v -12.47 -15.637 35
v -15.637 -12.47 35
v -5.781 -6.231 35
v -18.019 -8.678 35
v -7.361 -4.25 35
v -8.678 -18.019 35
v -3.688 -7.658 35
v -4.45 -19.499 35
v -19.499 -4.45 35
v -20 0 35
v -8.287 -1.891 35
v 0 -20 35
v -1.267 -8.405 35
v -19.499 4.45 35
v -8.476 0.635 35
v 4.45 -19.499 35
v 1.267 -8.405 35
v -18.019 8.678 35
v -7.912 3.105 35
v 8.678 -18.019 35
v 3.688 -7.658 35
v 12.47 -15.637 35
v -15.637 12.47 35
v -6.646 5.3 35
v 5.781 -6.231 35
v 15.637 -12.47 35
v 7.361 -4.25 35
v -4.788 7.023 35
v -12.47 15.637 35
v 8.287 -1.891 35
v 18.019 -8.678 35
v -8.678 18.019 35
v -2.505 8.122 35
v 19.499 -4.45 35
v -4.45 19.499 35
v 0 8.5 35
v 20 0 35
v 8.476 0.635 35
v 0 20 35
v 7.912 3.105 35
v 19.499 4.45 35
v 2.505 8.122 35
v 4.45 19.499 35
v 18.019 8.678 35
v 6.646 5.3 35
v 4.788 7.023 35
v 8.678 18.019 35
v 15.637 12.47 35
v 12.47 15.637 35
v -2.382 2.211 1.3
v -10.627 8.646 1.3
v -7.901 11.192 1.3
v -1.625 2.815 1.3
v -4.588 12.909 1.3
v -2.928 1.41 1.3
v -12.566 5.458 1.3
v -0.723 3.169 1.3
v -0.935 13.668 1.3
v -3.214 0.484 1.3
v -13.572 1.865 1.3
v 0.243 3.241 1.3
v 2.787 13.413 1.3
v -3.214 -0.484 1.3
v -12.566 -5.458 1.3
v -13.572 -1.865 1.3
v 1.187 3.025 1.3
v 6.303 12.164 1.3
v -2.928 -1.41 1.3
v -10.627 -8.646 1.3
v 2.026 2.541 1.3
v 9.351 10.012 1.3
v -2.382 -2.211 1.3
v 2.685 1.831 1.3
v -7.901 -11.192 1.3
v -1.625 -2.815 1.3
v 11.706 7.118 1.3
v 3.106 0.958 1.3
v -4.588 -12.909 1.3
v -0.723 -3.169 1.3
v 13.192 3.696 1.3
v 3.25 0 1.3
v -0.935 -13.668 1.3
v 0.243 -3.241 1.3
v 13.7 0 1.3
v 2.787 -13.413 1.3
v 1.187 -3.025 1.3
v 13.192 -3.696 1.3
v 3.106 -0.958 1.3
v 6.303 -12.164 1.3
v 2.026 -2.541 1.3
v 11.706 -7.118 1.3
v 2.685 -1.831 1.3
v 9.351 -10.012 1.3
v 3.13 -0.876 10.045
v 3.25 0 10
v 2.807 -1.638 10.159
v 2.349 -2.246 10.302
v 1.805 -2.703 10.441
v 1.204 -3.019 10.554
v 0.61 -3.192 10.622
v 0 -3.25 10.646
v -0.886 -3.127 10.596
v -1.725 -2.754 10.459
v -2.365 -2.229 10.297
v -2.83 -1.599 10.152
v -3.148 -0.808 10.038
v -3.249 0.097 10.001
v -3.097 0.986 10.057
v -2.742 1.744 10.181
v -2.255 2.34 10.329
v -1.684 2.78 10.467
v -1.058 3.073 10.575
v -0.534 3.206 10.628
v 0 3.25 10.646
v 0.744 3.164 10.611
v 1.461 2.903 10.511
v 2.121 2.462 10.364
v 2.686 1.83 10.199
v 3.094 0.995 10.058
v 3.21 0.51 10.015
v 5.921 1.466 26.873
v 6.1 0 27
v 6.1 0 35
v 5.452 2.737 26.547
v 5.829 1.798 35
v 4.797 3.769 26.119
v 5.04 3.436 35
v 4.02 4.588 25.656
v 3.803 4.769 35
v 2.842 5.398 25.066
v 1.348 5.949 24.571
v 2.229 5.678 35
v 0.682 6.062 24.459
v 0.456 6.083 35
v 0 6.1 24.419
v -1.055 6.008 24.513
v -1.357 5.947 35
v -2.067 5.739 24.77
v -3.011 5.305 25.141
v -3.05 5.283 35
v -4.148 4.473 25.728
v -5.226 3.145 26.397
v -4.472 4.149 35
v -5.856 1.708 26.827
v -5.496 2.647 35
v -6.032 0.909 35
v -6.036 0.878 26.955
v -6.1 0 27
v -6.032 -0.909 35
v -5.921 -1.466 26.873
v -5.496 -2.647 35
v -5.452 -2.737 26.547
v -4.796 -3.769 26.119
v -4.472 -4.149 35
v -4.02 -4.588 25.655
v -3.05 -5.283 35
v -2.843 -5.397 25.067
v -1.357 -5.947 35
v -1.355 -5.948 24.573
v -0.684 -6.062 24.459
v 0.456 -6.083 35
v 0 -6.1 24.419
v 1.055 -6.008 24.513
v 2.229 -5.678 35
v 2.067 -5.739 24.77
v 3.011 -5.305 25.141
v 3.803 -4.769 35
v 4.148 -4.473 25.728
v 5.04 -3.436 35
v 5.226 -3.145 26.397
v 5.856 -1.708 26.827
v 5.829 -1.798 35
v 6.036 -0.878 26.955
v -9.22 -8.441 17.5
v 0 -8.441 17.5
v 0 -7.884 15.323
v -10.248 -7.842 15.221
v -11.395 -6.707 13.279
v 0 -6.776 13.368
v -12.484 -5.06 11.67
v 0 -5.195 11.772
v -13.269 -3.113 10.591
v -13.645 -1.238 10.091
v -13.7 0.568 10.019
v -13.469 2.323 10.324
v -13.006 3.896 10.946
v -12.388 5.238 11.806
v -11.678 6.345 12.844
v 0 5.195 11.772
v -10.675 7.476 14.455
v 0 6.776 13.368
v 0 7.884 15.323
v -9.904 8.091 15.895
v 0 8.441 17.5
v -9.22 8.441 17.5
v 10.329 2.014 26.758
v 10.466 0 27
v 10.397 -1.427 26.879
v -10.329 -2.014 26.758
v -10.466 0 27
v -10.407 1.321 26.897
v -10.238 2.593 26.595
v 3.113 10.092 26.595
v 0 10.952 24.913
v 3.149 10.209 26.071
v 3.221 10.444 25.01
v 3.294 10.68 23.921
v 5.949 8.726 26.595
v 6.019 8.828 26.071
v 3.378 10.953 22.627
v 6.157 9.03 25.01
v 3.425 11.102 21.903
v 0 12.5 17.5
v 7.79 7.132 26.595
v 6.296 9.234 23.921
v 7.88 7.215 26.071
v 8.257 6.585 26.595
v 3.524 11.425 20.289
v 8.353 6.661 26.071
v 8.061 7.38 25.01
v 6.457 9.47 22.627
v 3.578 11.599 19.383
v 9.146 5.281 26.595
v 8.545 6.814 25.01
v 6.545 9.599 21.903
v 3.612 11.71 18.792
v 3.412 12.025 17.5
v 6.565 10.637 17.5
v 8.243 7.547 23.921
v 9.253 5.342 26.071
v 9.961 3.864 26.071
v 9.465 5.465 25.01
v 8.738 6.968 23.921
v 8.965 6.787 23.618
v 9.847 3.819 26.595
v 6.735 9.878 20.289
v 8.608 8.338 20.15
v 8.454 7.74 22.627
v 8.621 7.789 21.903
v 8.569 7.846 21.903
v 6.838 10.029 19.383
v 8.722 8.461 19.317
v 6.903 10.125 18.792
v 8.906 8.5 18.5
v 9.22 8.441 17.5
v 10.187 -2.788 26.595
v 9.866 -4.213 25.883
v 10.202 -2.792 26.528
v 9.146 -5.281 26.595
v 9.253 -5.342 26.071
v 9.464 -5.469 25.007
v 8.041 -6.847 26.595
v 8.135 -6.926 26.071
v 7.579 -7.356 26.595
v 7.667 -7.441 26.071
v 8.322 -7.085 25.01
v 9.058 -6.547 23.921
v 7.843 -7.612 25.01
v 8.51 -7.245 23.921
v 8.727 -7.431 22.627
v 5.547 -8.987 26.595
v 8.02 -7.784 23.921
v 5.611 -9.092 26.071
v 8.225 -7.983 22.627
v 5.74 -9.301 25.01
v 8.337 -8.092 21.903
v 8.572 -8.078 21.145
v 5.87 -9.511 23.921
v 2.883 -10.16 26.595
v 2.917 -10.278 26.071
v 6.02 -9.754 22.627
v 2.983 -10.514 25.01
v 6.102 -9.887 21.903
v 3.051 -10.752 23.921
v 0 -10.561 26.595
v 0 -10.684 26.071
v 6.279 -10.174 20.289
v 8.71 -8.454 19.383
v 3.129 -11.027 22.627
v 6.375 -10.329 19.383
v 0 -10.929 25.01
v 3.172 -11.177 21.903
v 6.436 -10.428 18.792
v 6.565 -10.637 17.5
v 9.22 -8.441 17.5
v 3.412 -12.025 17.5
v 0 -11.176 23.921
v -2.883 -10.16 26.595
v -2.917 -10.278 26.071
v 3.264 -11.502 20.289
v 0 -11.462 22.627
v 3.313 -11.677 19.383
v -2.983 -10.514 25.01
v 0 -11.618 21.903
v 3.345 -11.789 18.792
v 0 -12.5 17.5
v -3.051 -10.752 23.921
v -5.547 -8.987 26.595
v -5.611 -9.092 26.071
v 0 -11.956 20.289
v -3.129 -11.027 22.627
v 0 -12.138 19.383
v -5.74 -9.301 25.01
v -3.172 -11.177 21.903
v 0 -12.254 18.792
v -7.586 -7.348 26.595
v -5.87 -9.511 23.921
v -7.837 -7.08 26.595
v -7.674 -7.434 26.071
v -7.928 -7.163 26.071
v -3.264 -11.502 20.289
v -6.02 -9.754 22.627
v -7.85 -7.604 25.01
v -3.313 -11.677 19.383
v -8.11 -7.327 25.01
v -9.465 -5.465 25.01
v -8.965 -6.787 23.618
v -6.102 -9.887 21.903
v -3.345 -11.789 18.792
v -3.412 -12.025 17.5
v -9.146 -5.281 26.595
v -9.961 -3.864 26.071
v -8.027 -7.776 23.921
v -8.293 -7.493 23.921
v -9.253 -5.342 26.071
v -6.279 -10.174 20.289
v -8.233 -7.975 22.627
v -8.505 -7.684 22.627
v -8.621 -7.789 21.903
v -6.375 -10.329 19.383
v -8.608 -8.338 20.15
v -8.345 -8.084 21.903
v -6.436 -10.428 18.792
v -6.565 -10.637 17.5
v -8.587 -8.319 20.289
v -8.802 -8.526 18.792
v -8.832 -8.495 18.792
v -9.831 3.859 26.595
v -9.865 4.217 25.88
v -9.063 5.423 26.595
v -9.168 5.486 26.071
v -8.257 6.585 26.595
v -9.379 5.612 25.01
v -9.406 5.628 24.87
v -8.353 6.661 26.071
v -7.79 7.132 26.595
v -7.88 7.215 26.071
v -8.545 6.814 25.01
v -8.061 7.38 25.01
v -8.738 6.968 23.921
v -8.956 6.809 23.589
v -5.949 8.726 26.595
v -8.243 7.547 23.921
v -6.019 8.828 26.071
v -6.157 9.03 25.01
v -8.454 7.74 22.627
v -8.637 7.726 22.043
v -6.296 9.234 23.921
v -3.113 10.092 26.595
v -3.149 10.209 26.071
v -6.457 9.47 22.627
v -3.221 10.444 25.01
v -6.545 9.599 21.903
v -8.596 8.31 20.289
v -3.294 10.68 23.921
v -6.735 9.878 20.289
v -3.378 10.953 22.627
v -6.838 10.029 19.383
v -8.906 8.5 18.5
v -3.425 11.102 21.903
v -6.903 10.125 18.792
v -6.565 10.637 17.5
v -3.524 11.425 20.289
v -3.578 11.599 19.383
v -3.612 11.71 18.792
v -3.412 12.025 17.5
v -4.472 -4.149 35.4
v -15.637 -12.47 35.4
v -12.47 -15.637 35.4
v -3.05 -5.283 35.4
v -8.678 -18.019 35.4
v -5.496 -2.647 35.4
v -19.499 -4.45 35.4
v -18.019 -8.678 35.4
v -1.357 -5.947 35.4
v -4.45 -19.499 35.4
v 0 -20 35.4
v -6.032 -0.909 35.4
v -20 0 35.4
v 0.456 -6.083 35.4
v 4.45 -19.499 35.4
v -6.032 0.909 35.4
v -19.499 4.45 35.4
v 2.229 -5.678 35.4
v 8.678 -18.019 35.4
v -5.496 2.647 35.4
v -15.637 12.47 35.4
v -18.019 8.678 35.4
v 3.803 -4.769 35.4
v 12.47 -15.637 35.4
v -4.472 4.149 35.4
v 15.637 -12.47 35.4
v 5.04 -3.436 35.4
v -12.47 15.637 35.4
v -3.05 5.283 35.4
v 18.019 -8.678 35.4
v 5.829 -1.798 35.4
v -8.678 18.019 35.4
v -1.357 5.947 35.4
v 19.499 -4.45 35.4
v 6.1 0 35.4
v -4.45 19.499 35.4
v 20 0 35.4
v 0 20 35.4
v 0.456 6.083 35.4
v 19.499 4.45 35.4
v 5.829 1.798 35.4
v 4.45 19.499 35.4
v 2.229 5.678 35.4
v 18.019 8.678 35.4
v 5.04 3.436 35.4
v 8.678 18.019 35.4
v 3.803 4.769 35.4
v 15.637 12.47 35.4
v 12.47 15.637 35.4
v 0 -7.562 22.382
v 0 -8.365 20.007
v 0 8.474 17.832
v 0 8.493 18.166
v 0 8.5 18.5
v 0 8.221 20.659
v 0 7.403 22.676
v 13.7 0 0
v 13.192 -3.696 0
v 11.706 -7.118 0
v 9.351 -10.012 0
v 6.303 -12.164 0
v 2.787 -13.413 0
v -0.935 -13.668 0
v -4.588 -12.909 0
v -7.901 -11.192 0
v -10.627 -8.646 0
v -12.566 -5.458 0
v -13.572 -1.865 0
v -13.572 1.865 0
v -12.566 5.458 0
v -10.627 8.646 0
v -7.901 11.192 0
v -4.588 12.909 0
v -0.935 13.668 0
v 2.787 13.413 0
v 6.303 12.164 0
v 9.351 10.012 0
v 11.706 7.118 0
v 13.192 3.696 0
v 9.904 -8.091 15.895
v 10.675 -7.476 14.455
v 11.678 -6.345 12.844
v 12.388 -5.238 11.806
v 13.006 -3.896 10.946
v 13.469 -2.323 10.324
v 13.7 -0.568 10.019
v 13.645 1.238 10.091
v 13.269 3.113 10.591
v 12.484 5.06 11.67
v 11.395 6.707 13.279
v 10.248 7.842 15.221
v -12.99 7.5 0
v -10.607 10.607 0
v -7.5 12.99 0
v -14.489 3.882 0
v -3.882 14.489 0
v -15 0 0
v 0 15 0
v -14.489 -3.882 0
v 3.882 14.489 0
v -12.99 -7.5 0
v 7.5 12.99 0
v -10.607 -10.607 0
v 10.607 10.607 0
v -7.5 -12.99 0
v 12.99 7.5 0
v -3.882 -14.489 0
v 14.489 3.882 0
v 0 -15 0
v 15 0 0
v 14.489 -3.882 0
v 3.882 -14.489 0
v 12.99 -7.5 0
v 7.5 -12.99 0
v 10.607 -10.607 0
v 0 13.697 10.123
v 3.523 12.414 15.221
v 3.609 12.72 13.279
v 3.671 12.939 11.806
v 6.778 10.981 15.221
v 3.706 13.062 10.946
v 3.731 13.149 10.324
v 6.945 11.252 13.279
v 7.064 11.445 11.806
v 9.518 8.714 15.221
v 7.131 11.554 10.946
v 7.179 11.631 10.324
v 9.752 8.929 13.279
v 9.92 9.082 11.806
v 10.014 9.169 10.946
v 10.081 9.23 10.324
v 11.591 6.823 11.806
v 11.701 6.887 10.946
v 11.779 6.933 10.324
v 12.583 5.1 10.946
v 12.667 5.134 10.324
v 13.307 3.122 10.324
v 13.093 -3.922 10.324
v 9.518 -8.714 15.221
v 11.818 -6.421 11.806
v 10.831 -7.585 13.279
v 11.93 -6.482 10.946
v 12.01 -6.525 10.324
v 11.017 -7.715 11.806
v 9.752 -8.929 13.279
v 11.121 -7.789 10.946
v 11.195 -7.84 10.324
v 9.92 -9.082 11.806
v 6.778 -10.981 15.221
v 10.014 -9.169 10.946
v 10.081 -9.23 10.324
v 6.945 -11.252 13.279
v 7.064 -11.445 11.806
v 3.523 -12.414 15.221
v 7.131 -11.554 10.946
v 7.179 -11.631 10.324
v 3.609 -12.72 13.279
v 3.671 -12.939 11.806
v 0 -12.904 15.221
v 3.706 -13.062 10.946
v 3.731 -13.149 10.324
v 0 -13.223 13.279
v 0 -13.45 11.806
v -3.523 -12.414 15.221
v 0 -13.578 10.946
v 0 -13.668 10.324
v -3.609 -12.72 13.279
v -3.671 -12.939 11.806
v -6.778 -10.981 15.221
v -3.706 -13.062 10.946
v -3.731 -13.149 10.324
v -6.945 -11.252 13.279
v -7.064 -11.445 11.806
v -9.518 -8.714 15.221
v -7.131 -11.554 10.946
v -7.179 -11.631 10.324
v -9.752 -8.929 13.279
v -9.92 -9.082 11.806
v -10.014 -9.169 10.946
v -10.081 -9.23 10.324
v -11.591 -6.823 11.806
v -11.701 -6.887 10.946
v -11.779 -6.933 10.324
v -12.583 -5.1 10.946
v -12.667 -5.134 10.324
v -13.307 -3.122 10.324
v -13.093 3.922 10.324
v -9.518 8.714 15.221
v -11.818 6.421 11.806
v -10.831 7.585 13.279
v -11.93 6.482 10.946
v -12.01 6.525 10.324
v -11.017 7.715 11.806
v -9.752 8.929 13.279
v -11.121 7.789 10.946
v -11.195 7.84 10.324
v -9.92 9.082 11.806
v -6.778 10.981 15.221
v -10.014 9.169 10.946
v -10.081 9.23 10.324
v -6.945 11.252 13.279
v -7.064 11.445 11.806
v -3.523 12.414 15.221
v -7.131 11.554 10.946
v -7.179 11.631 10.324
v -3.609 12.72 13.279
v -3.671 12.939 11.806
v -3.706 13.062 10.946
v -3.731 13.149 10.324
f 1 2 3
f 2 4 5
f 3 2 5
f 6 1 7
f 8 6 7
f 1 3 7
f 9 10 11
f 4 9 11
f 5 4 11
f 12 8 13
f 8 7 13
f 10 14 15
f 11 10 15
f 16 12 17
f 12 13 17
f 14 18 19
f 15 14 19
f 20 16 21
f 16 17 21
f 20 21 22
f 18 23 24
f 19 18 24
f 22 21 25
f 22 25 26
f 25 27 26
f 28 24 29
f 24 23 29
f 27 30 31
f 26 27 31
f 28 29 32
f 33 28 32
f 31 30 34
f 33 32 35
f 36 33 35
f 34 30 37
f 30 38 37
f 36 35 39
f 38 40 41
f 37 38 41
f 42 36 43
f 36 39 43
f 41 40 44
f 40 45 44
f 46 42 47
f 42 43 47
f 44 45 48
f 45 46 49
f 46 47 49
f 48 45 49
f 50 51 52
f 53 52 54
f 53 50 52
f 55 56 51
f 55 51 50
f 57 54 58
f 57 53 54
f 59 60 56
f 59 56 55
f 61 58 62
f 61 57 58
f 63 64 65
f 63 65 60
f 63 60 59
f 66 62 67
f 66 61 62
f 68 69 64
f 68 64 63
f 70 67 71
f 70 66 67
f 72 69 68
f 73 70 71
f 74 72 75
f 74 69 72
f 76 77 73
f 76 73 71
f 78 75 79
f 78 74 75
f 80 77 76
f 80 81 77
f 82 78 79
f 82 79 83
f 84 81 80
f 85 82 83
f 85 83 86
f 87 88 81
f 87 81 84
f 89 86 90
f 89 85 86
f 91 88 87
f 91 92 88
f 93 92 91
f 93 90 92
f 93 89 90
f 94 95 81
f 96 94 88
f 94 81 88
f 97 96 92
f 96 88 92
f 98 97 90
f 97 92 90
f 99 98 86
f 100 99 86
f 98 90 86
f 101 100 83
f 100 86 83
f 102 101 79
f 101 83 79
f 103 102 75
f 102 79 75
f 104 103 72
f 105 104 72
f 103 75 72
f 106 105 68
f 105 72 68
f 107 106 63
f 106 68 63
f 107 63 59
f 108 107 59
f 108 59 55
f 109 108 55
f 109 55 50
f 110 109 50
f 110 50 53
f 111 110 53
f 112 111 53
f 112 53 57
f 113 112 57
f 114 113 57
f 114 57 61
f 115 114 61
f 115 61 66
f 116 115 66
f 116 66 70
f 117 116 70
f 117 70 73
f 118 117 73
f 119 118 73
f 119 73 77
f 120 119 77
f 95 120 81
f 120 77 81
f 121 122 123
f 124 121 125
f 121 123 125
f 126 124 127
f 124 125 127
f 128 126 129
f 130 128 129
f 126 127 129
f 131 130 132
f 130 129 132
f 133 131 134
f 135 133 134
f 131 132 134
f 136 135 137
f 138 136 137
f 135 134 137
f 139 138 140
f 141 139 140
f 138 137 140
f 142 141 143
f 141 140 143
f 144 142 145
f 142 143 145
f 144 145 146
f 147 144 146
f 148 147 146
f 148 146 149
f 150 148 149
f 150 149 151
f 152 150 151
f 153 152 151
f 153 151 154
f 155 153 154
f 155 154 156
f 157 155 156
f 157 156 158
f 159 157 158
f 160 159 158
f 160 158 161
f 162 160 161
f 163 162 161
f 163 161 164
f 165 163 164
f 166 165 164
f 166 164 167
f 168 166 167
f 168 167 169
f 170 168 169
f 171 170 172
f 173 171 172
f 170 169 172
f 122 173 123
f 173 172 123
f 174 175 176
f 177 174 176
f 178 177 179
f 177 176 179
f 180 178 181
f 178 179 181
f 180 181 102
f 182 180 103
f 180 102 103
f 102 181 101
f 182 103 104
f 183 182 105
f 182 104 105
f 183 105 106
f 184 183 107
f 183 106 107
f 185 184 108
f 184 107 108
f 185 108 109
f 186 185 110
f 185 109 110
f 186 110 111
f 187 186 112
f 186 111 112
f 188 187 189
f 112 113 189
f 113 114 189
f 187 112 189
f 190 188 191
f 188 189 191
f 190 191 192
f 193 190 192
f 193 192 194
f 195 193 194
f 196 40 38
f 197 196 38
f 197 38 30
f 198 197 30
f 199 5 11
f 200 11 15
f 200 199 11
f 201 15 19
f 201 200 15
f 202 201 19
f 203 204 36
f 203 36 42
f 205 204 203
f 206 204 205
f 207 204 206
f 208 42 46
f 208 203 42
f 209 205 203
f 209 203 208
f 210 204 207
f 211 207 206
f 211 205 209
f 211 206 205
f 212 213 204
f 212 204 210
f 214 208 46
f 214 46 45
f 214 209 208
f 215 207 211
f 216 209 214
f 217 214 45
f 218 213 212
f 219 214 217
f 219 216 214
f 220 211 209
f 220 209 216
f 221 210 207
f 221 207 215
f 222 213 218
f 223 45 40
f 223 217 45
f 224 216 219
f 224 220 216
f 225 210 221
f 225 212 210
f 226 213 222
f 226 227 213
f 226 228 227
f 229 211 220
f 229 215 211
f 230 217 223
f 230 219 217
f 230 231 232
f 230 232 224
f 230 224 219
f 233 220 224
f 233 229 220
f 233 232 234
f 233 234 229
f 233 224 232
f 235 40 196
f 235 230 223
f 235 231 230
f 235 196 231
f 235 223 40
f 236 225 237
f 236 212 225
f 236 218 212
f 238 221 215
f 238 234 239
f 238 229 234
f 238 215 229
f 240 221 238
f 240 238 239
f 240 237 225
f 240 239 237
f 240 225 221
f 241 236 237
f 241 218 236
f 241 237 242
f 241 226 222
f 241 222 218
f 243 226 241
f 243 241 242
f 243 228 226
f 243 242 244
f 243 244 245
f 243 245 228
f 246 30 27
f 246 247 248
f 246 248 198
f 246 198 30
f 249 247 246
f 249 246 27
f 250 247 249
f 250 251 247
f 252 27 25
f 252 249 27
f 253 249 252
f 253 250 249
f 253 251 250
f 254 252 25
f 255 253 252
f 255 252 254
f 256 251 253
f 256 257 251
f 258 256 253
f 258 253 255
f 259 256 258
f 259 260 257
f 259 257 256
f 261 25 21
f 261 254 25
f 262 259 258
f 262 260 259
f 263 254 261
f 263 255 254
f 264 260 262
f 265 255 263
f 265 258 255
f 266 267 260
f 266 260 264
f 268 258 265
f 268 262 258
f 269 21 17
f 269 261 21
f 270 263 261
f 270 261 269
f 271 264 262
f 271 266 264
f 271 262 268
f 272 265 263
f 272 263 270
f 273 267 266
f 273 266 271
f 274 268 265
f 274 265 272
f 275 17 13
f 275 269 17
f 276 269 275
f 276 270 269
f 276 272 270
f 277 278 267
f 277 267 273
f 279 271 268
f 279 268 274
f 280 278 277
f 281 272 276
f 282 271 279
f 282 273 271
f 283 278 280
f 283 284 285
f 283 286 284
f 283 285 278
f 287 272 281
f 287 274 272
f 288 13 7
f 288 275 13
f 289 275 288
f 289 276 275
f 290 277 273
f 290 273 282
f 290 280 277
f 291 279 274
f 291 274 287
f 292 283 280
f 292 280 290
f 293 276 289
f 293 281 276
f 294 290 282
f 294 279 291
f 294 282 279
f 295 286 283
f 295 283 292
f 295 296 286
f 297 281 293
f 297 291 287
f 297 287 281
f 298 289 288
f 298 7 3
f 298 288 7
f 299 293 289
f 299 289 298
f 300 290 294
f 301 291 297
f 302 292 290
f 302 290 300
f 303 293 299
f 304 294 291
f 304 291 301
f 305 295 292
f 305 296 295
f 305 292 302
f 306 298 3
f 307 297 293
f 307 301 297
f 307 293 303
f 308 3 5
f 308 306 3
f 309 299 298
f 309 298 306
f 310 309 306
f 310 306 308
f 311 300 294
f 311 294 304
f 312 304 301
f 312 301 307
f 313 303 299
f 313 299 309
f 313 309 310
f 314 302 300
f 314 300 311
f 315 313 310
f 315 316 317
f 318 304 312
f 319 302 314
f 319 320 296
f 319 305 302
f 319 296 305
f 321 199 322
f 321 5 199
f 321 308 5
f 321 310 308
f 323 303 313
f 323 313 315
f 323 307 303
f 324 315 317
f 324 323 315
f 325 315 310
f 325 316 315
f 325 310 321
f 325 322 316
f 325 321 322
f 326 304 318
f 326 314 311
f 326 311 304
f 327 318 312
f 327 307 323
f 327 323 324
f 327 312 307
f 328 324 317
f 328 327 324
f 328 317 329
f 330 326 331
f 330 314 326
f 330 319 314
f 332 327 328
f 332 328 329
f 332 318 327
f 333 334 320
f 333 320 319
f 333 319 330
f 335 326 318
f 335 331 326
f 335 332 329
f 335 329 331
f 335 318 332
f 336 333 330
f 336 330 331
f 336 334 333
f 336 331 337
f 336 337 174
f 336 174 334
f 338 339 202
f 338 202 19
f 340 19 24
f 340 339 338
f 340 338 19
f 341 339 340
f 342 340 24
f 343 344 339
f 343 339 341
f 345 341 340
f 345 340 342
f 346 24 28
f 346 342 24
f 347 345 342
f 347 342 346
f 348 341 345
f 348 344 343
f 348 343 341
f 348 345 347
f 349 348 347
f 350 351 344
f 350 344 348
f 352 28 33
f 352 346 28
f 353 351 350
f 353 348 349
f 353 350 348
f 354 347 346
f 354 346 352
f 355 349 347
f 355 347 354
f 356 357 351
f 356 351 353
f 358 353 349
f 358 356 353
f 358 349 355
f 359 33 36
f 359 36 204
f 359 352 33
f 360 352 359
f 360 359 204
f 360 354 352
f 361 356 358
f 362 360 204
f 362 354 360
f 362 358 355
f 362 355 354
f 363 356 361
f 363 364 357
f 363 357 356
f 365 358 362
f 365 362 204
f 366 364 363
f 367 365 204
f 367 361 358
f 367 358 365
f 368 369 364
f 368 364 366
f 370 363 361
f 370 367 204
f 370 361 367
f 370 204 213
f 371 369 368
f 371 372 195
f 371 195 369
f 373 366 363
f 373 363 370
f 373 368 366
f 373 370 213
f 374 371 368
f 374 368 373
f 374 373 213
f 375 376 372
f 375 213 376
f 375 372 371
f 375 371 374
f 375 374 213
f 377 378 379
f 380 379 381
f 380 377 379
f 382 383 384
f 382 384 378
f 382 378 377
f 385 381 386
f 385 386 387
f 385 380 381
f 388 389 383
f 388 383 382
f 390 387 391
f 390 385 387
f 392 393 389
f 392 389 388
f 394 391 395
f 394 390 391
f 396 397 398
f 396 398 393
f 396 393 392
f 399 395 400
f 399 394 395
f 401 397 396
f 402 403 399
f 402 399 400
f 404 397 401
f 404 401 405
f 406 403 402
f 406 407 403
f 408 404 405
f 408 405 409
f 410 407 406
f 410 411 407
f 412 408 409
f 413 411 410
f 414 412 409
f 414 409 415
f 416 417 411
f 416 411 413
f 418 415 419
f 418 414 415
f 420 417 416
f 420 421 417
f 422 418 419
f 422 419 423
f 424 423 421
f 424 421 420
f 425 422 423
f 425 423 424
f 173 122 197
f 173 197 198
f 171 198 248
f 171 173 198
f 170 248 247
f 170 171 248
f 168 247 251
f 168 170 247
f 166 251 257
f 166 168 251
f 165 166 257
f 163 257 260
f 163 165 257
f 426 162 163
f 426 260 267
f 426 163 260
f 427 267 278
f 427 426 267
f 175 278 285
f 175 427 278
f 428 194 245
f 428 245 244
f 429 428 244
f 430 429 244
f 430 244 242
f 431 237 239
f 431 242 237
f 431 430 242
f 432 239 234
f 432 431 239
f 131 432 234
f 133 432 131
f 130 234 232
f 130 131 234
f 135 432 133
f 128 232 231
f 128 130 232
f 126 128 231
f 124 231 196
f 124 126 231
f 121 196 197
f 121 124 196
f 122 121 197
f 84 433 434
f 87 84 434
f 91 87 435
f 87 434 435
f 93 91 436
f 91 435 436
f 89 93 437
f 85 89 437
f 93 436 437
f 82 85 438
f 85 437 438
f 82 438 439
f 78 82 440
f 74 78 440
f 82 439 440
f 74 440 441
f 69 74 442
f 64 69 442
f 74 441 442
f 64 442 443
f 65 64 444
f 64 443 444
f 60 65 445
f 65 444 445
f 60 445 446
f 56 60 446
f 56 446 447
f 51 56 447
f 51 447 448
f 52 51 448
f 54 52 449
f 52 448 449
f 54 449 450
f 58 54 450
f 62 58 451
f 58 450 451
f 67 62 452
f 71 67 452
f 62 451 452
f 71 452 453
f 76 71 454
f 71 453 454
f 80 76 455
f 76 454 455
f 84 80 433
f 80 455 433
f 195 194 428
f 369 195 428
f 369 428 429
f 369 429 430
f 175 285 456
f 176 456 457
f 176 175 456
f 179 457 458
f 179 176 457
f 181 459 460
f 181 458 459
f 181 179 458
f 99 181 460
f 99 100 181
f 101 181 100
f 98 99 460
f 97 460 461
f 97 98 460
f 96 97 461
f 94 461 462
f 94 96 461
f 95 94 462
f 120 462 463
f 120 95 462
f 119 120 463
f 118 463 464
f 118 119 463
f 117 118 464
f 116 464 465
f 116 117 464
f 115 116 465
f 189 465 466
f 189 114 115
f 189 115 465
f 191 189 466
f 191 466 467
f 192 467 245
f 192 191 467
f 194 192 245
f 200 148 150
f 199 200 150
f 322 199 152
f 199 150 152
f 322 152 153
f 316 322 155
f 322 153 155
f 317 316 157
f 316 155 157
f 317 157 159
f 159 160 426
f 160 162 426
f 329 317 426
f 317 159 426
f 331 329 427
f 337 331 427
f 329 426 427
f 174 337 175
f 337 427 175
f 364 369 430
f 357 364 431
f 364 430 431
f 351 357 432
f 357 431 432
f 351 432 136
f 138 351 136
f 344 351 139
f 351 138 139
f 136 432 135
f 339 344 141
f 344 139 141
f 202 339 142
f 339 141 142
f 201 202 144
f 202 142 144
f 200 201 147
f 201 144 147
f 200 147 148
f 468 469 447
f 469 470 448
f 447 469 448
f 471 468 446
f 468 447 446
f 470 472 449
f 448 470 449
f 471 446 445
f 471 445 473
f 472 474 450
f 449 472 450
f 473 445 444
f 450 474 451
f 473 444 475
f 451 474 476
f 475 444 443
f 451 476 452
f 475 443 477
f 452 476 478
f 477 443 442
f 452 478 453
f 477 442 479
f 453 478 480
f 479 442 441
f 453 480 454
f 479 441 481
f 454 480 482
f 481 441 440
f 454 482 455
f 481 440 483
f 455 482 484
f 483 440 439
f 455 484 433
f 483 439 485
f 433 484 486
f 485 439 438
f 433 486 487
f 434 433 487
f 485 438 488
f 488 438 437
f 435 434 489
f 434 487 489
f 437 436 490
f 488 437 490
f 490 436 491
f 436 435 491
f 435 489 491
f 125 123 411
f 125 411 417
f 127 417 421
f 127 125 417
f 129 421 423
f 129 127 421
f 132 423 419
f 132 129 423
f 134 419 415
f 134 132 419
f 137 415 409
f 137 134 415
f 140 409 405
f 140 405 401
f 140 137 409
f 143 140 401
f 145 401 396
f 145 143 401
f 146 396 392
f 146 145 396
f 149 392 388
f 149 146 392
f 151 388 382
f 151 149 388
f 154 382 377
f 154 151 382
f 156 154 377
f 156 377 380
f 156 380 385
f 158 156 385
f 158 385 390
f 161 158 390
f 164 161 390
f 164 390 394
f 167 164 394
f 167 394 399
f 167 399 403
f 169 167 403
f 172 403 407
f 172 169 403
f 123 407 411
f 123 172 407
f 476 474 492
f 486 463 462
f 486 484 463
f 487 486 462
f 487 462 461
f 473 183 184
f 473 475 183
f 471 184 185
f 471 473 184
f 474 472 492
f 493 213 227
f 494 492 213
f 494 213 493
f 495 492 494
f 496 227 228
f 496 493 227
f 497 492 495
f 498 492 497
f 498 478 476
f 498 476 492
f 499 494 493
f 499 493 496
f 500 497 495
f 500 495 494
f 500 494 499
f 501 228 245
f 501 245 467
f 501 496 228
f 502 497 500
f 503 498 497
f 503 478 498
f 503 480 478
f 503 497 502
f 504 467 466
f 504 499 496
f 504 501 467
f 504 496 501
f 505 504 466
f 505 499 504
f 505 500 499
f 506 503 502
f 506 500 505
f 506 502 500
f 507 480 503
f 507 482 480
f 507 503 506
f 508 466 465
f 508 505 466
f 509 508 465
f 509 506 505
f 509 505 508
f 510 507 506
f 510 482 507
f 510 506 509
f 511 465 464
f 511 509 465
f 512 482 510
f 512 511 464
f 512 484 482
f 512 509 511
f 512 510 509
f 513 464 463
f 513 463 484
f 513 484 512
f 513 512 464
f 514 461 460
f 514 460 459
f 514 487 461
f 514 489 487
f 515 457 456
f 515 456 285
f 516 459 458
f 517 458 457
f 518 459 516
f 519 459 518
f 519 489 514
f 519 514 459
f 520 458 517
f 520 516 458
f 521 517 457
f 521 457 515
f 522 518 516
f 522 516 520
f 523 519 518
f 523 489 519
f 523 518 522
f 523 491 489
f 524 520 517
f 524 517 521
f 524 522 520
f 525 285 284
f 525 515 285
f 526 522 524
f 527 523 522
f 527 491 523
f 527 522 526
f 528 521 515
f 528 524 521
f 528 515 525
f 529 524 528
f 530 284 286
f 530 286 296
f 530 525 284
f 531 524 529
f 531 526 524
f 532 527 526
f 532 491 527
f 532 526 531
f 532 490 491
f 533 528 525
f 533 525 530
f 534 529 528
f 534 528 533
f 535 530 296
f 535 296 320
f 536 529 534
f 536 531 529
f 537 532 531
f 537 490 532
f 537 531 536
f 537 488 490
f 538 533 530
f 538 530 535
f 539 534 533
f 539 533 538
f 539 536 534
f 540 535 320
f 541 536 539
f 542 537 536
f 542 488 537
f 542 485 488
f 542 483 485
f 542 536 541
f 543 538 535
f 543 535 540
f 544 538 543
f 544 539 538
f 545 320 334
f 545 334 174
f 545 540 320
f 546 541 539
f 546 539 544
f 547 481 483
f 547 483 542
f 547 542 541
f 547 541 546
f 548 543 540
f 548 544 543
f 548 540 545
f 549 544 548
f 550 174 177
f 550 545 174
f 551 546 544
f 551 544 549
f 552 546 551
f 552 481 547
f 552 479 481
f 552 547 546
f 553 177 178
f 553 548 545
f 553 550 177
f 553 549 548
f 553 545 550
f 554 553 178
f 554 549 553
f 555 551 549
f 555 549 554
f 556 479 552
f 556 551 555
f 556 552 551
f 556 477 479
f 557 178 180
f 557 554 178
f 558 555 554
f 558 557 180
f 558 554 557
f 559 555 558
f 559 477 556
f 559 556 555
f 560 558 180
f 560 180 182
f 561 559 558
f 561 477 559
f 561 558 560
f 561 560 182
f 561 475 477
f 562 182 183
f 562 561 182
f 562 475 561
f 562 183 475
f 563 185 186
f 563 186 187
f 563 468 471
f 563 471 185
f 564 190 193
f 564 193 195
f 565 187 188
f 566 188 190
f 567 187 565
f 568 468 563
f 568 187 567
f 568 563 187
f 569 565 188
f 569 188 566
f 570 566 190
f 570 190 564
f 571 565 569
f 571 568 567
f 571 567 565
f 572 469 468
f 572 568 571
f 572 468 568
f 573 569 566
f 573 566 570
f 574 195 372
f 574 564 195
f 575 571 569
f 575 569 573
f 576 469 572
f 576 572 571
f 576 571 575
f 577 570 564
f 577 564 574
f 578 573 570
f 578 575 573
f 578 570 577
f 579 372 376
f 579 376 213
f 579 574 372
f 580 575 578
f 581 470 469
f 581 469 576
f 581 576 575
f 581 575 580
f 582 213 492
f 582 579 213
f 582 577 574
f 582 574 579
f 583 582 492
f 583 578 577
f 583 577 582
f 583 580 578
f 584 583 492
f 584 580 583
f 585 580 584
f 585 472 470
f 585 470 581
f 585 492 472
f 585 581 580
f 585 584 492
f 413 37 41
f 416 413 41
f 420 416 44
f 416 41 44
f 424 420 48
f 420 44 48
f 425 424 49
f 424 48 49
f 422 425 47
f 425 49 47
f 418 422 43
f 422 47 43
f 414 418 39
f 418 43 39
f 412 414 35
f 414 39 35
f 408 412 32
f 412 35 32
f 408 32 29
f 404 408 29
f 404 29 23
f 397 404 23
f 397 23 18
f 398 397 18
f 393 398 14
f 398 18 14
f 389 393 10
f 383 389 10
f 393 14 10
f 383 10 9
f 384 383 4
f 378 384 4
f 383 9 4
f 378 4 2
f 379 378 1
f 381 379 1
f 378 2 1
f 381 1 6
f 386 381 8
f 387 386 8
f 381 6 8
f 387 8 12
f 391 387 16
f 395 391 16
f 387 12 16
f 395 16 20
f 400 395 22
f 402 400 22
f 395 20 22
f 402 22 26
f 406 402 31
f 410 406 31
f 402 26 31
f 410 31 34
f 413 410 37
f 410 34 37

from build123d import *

# Parameters (mm, degrees)
F3_DEPTH = 15
F2_R     = 6.1
F4_DEPTH = 20
F5_R     = 3.25
F6_DEPTH = 20
F5_R_2   = 13.7
F7_DEPTH = 1.3
F2_R_2   = 20
F2_R_3   = 8.5
F8_DEPTH = 0.4


with BuildPart() as f1:
    # F0 (on Right) → F1 (revolve)
    with BuildSketch(Plane.YZ):
        with BuildLine():
            Line((0, 10), (0, 0))
            Line((0, 0), (15, 0))
            add(Edge.make_bspline(
                [(12.5, 17.5), (13.5772919142, 11.6888974623), (14.2886459571, 5.8444487312), (15, 0)],
                knots=[0.5019201889, 0.5019201889, 0.5019201889, 0.5019201889, 1, 1, 1, 1], degree=3))
            Line((12.5, 17.5), (8.4409715081, 17.5))
            ThreePointArc((8.4409715081, 17.5), (5.6457948953, 12.1458674864), (0, 10))
        make_face()
        with BuildLine():
            Line((8.4409715081, 17.5), (12.5, 17.5))
            add(Edge.make_bspline(
                [(8.5, 35), (9.9572008854, 29.1779541329), (11.4144017707, 23.3559082658), (12.5, 17.5)],
                knots=[0, 0, 0, 0, 0.5019201889, 0.5019201889, 0.5019201889, 0.5019201889], degree=3))
            Line((8.5, 35), (0, 35))
            Line((0, 35), (0, 27))
            ThreePointArc((0, 27), (6.0104076401, 24.5104076401), (8.5, 18.5))
            ThreePointArc((8.5, 18.5), (8.4852300446, 17.9991296668), (8.4409715081, 17.5))
        make_face()
    revolve(axis=Axis((0, 0, 17.5), (0, 0, -1)))

    # F0 (on Right) → F3 (cut, symmetric)
    with BuildSketch(Plane.YZ):
        with BuildLine():
            Line((0, 17.5), (0, 10))
            ThreePointArc((0, 10), (5.6457948953, 12.1458674864), (8.4409715081, 17.5))
            Line((8.4409715081, 17.5), (0, 17.5))
        make_face()
        with BuildLine():
            ThreePointArc((-8.4409715081, 17.5), (-5.6457948953, 12.1458674864), (0, 10))
            Line((0, 10), (0, 17.5))
            Line((0, 17.5), (-8.4409715081, 17.5))
        make_face()
        with BuildLine():
            ThreePointArc((0, 27), (-6.3541325136, 24.1457948953), (-8.4409715081, 17.5))
            Line((-8.4409715081, 17.5), (0, 17.5))
            Line((0, 17.5), (0, 27))
        make_face()
        with BuildLine():
            Line((0, 27), (0, 17.5))
            Line((0, 17.5), (8.4409715081, 17.5))
            ThreePointArc((8.4409715081, 17.5), (8.4852300446, 17.9991296668), (8.5, 18.5))
            ThreePointArc((8.5, 18.5), (6.0104076401, 24.5104076401), (0, 27))
        make_face()
    extrude(amount=F3_DEPTH, both=True, mode=Mode.SUBTRACT)

    # F2 (on face) → F4 (cut)
    with BuildSketch(Plane.XY.offset(35)):
        Circle(F2_R)
    extrude(amount=-F4_DEPTH, mode=Mode.SUBTRACT)

    # F5 (on face) → F6 (cut)
    with BuildSketch(Plane(origin=(0, 0, 0), x_dir=(1, 0, 0), z_dir=(0, 0, -1))):
        Circle(F5_R)
    extrude(amount=-F6_DEPTH, mode=Mode.SUBTRACT)

    # F5 (on face) → F7 (cut)
    with BuildSketch(Plane(origin=(0, 0, 0), x_dir=(1, 0, 0), z_dir=(0, 0, -1))):
        Circle(F5_R_2)
        Circle(F5_R, mode=Mode.SUBTRACT)
    extrude(amount=-F7_DEPTH, mode=Mode.SUBTRACT)

    # F2 (on face) → F8 (join)
    with BuildSketch(Plane.XY.offset(35)):
        Circle(F2_R_2)
        Circle(F2_R_3, mode=Mode.SUBTRACT)
        Circle(F2_R_3)
        Circle(F2_R, mode=Mode.SUBTRACT)
    extrude(amount=F8_DEPTH)


solid = f1.part
